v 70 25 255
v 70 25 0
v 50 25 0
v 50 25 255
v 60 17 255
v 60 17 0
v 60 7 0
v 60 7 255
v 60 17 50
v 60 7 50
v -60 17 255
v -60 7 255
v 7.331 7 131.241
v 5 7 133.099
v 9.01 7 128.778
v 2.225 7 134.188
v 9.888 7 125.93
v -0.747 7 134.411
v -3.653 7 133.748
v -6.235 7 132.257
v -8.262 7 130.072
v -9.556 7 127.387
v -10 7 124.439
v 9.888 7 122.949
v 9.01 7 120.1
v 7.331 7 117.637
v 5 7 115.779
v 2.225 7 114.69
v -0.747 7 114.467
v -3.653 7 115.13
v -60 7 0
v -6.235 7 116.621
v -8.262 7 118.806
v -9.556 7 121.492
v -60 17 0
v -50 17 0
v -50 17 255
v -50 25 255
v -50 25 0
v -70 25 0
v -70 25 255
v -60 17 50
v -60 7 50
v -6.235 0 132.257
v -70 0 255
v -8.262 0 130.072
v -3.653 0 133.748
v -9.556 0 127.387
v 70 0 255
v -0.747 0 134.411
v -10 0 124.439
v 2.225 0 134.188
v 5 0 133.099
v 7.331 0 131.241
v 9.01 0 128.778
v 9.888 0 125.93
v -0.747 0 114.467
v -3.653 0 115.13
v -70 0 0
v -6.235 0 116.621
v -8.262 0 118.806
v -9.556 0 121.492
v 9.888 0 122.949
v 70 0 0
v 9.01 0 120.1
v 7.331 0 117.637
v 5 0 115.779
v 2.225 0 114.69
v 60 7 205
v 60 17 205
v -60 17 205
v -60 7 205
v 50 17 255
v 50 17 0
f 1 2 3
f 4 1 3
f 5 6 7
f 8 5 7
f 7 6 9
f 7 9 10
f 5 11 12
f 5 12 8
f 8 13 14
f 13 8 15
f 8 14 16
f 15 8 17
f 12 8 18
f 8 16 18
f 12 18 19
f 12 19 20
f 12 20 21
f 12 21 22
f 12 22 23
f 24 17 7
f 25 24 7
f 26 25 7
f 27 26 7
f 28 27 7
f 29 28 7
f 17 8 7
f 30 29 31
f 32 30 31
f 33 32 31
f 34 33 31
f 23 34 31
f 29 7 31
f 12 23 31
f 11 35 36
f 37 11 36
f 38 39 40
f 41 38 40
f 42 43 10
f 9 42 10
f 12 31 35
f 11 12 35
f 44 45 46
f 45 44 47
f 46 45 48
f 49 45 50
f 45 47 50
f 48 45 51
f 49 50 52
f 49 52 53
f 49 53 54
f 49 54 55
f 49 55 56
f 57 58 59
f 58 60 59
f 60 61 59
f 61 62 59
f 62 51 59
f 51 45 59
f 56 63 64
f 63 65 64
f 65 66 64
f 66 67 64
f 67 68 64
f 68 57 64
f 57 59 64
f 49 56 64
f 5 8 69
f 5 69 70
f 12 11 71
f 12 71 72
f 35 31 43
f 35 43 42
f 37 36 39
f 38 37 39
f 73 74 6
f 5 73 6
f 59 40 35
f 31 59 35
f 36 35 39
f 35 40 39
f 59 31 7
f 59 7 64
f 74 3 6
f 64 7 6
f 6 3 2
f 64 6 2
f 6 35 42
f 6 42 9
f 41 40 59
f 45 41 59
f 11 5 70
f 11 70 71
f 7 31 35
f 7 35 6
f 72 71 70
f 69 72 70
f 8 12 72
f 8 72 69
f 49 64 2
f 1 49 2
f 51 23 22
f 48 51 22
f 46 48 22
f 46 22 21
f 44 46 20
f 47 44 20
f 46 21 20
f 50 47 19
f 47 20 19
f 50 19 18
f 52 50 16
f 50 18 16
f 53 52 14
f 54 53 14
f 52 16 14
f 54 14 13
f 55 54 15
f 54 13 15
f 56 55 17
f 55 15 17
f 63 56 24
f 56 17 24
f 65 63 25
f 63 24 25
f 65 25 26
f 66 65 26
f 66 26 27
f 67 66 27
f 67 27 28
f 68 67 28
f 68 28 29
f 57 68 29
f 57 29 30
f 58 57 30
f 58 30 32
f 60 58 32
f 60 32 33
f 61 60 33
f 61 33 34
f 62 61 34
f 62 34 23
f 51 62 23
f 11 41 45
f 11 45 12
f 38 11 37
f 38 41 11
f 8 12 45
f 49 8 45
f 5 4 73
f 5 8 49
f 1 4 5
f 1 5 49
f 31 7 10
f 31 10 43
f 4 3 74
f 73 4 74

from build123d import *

# Parameters (mm, degrees)
F1_DEPTH = 255
F2_R     = 10
F3_DEPTH = 12
F5_DEPTH = 50
F7_DEPTH = 50


with BuildPart() as f1:
    # F0 (on Top) → F1 (new body)
    with BuildSketch(Plane.XY):
        Polygon((-70, 0), (0, 0), (70, 0), (70, 25), (50, 25), (50, 17), (60, 17), (60, 7), (0, 7), (-60, 7), (-60, 17), (-50, 17), (-50, 25), (-70, 25), align=None)
    extrude(amount=F1_DEPTH)

    # F2 (on face) → F3 (cut)
    with BuildSketch(Plane(origin=(0, 7, 0), x_dir=(-1, 0, 0), z_dir=(0, 1, 0))):
        with Locations((0, 124.4391358025)):
            Circle(F2_R)
    extrude(amount=-F3_DEPTH, mode=Mode.SUBTRACT)


with BuildPart() as f5:
    # F4 (on face) → F5 (new body)
    with BuildSketch(Plane.XY.offset(255)):
        Polygon((50, 17), (-50, 17), (-60, 17), (-60, 7), (60, 7), (60, 17), align=None)
    extrude(amount=-F5_DEPTH)


with BuildPart() as f7:
    # F6 (on face) → F7 (new body)
    with BuildSketch(Plane(origin=(0, 0, 0), x_dir=(1, 0, 0), z_dir=(0, 0, -1))):
        Polygon((60, -7), (-60, -7), (-60, -17), (-50, -17), (50, -17), (60, -17), align=None)
    extrude(amount=-F7_DEPTH)


solid = Compound([f1.part, f5.part, f7.part])
